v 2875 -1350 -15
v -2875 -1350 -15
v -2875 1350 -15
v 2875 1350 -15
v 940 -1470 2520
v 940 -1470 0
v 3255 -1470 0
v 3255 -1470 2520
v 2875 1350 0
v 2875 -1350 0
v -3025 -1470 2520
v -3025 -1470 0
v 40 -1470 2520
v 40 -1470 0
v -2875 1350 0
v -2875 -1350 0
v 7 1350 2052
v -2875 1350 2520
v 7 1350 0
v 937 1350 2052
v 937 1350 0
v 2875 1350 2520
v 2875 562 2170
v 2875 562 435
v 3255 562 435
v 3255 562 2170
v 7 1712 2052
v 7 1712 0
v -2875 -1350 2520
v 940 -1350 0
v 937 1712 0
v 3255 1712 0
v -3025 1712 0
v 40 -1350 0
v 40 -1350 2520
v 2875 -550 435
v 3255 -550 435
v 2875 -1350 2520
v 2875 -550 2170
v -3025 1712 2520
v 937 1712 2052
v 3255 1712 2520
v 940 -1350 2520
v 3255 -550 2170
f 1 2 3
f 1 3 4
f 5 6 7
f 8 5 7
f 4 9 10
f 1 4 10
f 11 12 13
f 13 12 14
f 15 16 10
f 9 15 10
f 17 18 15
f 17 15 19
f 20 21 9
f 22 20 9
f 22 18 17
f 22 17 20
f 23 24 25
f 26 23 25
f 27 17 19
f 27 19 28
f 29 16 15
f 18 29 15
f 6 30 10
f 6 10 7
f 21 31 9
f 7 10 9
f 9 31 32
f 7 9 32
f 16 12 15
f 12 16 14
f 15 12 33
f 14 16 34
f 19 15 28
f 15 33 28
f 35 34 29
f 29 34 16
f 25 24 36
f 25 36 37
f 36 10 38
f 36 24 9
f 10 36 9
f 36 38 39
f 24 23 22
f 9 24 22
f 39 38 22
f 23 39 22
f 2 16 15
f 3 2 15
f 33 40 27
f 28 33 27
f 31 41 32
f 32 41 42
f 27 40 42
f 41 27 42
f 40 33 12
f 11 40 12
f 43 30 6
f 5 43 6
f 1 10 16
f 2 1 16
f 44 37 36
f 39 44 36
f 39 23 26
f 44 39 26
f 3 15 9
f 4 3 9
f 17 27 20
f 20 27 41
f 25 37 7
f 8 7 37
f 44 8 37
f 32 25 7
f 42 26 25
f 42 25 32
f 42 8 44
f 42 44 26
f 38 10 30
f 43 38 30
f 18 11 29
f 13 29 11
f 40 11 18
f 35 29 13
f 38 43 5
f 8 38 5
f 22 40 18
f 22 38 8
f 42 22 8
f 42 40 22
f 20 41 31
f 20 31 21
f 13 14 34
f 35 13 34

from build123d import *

# Parameters (mm, degrees)
F1_DEPTH = 2520
F0_W     = 380
F0_H     = 1112
F2_DEPTH = 435
F3_W     = 380
F3_H     = 1112
F4_DEPTH = 350
F5_W     = 930
F5_H     = 362
F6_DEPTH = 468
F8_DEPTH = 15


with BuildPart() as f1:
    # F0 (on Top) → F1 (new body)
    with BuildSketch(Plane.XY):
        Polygon((40, -1470), (40, -1350), (-2875, -1350), (-2875, 1350), (7, 1350), (7, 1712), (-3025, 1712), (-3025, -1470), align=None)
        Polygon((2875, 1350), (2875, 562), (3255, 562), (3255, 1712), (937, 1712), (937, 1350), align=None)
        Polygon((2875, -550), (2875, -1350), (940, -1350), (940, -1470), (3255, -1470), (3255, -550), align=None)
    extrude(amount=F1_DEPTH)

    # F0 (on Top) → F2 (join)
    with BuildSketch(Plane.XY):
        with Locations((3065, 6)):
            Rectangle(F0_W, F0_H)
    extrude(amount=F2_DEPTH)

    # F3 (on face) → F4 (join)
    with BuildSketch(Plane.XY.offset(2520)):
        with Locations((3065, 6)):
            Rectangle(F3_W, F3_H)
    extrude(amount=-F4_DEPTH)

    # F5 (on face) → F6 (join)
    with BuildSketch(Plane.XY.offset(2520)):
        with Locations((472, 1531)):
            Rectangle(F5_W, F5_H)
    extrude(amount=-F6_DEPTH)


with BuildPart() as f8:
    # F7 (on face) → F8 (new body)
    with BuildSketch(Plane(origin=(0, 0, 0), x_dir=(1, 0, 0), z_dir=(0, 0, -1))):
        Polygon((40, 1350), (-2875, 1350), (-2875, -1350), (7, -1350), (2875, -1350), (2875, 1350), align=None)
    extrude(amount=F8_DEPTH)


solid = Compound([f1.part, f8.part])
